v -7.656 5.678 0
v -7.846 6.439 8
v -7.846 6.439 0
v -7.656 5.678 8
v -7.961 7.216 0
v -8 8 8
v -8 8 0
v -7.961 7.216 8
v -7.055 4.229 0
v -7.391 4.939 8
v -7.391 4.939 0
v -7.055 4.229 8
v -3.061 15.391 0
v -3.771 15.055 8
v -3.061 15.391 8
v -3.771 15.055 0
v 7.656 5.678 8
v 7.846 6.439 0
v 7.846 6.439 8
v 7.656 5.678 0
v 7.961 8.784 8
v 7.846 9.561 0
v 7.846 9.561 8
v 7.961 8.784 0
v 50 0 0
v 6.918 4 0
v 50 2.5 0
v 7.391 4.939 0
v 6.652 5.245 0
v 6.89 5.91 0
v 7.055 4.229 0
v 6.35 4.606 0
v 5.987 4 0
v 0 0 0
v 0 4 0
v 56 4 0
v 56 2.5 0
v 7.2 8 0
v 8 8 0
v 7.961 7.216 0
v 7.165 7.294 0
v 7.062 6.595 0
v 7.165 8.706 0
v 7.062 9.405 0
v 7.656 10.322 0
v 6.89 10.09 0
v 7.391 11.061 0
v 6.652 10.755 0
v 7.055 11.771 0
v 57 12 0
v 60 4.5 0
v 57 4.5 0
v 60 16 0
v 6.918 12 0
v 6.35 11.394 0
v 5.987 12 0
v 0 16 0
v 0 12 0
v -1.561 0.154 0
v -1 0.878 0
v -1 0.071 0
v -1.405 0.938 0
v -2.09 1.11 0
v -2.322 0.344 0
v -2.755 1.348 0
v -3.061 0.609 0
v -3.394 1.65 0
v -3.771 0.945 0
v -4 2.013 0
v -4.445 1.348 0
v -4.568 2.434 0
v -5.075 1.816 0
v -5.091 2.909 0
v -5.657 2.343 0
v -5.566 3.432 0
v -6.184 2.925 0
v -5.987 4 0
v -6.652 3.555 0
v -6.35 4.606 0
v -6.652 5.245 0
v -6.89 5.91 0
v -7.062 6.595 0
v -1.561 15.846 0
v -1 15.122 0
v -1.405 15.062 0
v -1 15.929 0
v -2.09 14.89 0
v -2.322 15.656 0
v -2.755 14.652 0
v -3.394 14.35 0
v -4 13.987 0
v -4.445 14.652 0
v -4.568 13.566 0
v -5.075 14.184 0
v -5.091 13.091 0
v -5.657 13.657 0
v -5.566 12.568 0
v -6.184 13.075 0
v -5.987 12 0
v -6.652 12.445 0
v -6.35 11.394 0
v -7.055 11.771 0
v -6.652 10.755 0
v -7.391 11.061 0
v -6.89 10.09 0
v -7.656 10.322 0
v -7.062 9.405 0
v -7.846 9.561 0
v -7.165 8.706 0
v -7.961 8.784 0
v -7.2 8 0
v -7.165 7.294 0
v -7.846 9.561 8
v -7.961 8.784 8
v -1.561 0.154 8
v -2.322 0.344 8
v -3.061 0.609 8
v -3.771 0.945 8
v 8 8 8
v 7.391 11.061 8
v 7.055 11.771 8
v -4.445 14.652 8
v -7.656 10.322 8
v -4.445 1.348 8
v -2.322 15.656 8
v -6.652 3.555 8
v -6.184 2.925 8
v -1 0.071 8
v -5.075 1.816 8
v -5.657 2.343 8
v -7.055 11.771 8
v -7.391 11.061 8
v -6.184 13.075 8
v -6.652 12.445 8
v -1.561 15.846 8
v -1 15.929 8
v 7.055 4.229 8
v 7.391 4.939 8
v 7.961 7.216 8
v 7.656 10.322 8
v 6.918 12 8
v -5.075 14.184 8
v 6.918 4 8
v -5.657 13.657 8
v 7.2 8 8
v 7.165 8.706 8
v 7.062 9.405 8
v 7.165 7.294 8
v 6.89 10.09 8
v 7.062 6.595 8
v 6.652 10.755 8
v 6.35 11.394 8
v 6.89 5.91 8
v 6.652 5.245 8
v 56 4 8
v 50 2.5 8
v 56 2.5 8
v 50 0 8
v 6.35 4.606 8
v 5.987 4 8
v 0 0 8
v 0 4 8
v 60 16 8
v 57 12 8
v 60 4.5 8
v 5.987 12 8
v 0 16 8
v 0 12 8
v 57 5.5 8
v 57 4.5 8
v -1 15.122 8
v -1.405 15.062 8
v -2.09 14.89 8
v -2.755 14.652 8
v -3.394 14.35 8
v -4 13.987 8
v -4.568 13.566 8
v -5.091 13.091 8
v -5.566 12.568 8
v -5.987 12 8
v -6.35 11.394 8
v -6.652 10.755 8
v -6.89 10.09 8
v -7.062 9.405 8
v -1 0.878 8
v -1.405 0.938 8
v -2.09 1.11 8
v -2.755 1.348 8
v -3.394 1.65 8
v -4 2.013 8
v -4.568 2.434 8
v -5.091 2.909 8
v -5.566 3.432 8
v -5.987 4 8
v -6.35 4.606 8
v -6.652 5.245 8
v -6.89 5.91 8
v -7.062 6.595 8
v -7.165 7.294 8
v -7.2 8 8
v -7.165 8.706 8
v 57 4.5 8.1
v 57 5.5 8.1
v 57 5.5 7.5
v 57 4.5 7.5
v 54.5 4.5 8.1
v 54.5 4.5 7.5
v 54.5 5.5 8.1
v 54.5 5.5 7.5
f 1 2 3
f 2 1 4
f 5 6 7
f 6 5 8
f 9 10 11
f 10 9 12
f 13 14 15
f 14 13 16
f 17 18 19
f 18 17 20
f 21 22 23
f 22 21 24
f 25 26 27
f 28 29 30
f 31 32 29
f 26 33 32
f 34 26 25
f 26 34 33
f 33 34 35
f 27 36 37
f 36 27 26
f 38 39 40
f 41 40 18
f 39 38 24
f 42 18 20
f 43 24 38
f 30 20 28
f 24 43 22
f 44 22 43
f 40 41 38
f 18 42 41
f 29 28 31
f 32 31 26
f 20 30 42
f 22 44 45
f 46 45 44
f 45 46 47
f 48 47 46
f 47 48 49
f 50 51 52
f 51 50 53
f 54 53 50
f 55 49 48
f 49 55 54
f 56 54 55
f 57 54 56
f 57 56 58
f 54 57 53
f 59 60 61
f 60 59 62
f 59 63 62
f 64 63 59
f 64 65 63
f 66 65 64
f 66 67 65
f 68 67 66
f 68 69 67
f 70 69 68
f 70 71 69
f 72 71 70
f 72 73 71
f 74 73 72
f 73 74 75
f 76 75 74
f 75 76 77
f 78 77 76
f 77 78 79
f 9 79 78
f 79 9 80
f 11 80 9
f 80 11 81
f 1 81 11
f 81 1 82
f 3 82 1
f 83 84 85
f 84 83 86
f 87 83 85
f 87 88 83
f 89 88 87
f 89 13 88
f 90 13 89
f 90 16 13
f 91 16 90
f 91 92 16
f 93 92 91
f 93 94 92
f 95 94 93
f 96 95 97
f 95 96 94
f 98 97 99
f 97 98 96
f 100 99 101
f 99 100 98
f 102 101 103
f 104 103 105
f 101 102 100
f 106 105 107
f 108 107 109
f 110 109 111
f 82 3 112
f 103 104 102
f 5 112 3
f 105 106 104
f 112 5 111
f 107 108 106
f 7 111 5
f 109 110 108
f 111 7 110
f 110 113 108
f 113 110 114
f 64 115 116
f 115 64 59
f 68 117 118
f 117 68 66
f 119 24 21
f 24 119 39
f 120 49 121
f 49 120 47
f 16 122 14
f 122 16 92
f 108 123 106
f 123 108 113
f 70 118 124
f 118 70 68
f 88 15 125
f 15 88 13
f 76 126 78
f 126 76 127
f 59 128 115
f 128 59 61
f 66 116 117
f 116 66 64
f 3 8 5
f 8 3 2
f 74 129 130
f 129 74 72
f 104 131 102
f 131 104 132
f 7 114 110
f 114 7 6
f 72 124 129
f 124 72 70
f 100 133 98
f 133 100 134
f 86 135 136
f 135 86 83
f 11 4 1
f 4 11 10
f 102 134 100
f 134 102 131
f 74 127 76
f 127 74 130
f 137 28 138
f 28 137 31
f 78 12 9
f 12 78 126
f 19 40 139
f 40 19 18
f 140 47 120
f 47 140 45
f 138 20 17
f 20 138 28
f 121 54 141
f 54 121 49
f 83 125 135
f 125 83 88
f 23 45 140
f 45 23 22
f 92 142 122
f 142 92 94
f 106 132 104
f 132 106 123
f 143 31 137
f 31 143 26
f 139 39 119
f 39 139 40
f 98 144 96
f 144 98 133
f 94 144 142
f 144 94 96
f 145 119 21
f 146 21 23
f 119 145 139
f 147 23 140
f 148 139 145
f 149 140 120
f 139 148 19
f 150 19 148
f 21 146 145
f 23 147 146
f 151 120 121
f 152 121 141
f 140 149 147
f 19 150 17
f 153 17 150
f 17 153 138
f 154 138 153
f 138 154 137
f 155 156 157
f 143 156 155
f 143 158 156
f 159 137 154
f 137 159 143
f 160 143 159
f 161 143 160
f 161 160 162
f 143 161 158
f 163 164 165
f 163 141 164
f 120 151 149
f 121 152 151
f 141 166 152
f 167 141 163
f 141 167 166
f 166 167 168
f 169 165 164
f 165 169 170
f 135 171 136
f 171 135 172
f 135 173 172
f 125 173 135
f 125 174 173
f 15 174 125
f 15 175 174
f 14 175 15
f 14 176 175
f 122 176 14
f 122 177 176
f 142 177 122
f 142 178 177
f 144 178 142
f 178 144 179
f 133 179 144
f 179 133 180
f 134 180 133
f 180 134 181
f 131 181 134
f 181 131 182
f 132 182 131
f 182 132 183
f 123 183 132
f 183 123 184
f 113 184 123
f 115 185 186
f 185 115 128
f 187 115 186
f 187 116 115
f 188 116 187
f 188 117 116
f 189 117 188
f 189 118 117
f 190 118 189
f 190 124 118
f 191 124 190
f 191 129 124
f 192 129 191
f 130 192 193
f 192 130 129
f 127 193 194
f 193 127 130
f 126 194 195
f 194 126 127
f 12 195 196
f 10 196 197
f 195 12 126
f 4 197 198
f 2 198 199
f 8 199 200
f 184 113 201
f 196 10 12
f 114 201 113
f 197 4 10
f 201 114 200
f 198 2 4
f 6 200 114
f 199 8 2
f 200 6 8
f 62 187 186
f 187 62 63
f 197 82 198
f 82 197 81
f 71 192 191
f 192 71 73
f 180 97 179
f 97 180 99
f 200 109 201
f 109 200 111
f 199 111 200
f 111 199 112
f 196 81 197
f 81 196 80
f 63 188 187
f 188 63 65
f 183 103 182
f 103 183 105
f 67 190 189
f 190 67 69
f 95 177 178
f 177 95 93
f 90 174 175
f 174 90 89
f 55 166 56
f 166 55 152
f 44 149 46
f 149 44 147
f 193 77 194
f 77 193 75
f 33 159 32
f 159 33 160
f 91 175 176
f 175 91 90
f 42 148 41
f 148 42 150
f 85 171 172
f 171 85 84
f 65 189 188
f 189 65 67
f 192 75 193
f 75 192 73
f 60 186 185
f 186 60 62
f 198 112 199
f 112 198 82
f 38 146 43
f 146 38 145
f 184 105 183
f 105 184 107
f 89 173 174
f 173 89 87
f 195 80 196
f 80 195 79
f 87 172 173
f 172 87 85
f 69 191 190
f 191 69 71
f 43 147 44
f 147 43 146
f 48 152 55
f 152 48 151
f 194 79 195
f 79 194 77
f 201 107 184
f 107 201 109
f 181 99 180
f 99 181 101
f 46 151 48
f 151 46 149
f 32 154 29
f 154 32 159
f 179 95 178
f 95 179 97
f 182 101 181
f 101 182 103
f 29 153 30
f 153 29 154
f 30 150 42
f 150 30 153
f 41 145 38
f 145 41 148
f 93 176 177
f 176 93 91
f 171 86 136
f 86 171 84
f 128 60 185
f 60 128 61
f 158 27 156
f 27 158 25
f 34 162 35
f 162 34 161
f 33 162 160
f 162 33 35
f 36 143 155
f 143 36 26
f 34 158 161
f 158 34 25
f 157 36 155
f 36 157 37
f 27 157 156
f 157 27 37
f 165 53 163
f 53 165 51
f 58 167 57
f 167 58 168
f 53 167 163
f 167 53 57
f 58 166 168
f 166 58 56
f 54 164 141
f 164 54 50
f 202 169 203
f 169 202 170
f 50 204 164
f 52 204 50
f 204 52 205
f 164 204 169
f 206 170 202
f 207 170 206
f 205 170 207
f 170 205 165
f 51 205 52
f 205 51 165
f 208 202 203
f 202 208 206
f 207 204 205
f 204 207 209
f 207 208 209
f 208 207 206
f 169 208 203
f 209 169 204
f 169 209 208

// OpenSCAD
// Pinch clamp for silicone tubing (up to 6.4 mm)
// Designed for FDM printing: printed flat in the XY plane.

// --- Dimensions ---
thickness = 8.0;           // Extrusion height (Z)
lower_len = 50.0;          // Length of lower jaw bar
lower_wid = 4.0;           // Width of lower jaw bar
lower_tongue_len = 6.0;    // Length of lower jaw tongue
lower_tongue_wid = 1.5;    // Width of lower jaw tongue (4 - 2.5)
lower_tongue_y_start = 2.5;
lower_tongue_y_end = 4.0;

upper_len = 60.0;          // Length of upper jaw bar
upper_wid = 4.0;           // Width of upper jaw bar
upper_y_start = 12.0;
upper_y_end = 16.0;

hinge_center_x = 0;
hinge_center_y = 8;
hinge_r_inner = 7.2;
hinge_r_outer = 8.0;

ridge_radius = 1.5;
ridge_x = 27.5;

latch_leg_x_start = 57.0;
latch_leg_x_end = 60.0;
latch_leg_y_start = 4.5;
latch_leg_y_end = 12.0;

latch_nose_x_start = 54.5;
latch_nose_x_end = 57.0;
latch_nose_y_start = 4.5;
latch_nose_y_end = 5.5;
latch_nose_z_offset = 0.5; // Height above the tongue

$fn = 64;

// --- Construction ---

module hinge_half_ring() {
    // A half-ring on the x < 0 side
    difference() {
        // Outer half-circle
        translate([hinge_center_x, hinge_center_y, 0])
            rotate([0, 0, 180])
            cylinder(h = thickness, r = hinge_r_outer);
        
        // Inner half-circle (to create the ring)
        translate([hinge_center_x, hinge_center_y, -1])
            rotate([0, 0, 180])
            cylinder(h = thickness + 2, r = hinge_r_inner);
            
        // Cut the right side to make it a half-ring
        translate([hinge_center_x - 1, hinge_center_y - hinge_r_outer - 1, -1])
            cube([2, hinge_r_outer * 2 + 2, thickness + 2]);
    }
}

module ridge() {
    // Half-round ridge on the inner face
    rotate([0, 90, 0])
    cylinder(h = 2, r = ridge_radius);
}

module clamp_body() {
    union() {
        // Lower Jaw Bar
        cube([lower_len, lower_wid, thickness]);
        
        // Lower Jaw Tongue
        translate([lower_len, lower_tongue_y_start, 0])
            cube([lower_tongue_len, lower_tongue_wid, thickness]);
            
        // Upper Jaw Bar
        translate([0, upper_y_start, 0])
            cube([upper_len, upper_wid, thickness]);
            
        // Hinge
        hinge_half_ring();
        
        // Latch Leg
        translate([latch_leg_x_start, latch_leg_y_start, 0])
            cube([latch_leg_x_end - latch_leg_x_start, latch_leg_y_end - latch_leg_y_start, thickness]);
            
        // Latch Nose
        translate([latch_nose_x_start, latch_nose_y_start, thickness - latch_nose_z_offset])
            cube([latch_nose_x_end - latch_nose_x_start, latch_nose_y_end - latch_nose_y_start, latch_nose_z_offset + 0.1]);
    }
}

module ridges_and_cutouts() {
    // The ridges are added to the inner faces
    // The ridges are modeled as 3D objects, but since we want them to be "half-round" 
    // protruding from the face, we use a union of the body and the ridge.
    // However, to keep the code clean, we will build the body and then add ridges.
    
    // Ridge 1 (Lower Jaw)
    translate([ridge_x, ridge_radius, thickness/2])
        rotate([0, 90, 0])
        cylinder(h = 1, r = ridge_radius);
        
    // Ridge 2 (Upper Jaw)
    translate([ridge_x, upper_y_end - ridge_radius, thickness/2])
        rotate([0, 90, 0])
        cylinder(h = 1, r = ridge_radius);
}

// Final Assembly
// We use a union of the main body and the ridges.
// Note: The user description implies the ridges are on the "inner face".
// For the lower jaw, the inner face is at y = 4.
// For the upper jaw, the inner face is at y = 12.

union() {
    clamp_body();
    
    // Lower ridge (at y=4)
    translate([ridge_x, lower_wid - ridge_radius, thickness/2])
        rotate([0, 90, 0])
        cylinder(h = 1, r = ridge_radius);
        
    // Upper ridge (at y=12)
    translate([ridge_x, upper_y_start + ridge_radius, thickness/2])
        rotate([0, 90, 0])
        cylinder(h = 1, r = ridge_radius);
}
